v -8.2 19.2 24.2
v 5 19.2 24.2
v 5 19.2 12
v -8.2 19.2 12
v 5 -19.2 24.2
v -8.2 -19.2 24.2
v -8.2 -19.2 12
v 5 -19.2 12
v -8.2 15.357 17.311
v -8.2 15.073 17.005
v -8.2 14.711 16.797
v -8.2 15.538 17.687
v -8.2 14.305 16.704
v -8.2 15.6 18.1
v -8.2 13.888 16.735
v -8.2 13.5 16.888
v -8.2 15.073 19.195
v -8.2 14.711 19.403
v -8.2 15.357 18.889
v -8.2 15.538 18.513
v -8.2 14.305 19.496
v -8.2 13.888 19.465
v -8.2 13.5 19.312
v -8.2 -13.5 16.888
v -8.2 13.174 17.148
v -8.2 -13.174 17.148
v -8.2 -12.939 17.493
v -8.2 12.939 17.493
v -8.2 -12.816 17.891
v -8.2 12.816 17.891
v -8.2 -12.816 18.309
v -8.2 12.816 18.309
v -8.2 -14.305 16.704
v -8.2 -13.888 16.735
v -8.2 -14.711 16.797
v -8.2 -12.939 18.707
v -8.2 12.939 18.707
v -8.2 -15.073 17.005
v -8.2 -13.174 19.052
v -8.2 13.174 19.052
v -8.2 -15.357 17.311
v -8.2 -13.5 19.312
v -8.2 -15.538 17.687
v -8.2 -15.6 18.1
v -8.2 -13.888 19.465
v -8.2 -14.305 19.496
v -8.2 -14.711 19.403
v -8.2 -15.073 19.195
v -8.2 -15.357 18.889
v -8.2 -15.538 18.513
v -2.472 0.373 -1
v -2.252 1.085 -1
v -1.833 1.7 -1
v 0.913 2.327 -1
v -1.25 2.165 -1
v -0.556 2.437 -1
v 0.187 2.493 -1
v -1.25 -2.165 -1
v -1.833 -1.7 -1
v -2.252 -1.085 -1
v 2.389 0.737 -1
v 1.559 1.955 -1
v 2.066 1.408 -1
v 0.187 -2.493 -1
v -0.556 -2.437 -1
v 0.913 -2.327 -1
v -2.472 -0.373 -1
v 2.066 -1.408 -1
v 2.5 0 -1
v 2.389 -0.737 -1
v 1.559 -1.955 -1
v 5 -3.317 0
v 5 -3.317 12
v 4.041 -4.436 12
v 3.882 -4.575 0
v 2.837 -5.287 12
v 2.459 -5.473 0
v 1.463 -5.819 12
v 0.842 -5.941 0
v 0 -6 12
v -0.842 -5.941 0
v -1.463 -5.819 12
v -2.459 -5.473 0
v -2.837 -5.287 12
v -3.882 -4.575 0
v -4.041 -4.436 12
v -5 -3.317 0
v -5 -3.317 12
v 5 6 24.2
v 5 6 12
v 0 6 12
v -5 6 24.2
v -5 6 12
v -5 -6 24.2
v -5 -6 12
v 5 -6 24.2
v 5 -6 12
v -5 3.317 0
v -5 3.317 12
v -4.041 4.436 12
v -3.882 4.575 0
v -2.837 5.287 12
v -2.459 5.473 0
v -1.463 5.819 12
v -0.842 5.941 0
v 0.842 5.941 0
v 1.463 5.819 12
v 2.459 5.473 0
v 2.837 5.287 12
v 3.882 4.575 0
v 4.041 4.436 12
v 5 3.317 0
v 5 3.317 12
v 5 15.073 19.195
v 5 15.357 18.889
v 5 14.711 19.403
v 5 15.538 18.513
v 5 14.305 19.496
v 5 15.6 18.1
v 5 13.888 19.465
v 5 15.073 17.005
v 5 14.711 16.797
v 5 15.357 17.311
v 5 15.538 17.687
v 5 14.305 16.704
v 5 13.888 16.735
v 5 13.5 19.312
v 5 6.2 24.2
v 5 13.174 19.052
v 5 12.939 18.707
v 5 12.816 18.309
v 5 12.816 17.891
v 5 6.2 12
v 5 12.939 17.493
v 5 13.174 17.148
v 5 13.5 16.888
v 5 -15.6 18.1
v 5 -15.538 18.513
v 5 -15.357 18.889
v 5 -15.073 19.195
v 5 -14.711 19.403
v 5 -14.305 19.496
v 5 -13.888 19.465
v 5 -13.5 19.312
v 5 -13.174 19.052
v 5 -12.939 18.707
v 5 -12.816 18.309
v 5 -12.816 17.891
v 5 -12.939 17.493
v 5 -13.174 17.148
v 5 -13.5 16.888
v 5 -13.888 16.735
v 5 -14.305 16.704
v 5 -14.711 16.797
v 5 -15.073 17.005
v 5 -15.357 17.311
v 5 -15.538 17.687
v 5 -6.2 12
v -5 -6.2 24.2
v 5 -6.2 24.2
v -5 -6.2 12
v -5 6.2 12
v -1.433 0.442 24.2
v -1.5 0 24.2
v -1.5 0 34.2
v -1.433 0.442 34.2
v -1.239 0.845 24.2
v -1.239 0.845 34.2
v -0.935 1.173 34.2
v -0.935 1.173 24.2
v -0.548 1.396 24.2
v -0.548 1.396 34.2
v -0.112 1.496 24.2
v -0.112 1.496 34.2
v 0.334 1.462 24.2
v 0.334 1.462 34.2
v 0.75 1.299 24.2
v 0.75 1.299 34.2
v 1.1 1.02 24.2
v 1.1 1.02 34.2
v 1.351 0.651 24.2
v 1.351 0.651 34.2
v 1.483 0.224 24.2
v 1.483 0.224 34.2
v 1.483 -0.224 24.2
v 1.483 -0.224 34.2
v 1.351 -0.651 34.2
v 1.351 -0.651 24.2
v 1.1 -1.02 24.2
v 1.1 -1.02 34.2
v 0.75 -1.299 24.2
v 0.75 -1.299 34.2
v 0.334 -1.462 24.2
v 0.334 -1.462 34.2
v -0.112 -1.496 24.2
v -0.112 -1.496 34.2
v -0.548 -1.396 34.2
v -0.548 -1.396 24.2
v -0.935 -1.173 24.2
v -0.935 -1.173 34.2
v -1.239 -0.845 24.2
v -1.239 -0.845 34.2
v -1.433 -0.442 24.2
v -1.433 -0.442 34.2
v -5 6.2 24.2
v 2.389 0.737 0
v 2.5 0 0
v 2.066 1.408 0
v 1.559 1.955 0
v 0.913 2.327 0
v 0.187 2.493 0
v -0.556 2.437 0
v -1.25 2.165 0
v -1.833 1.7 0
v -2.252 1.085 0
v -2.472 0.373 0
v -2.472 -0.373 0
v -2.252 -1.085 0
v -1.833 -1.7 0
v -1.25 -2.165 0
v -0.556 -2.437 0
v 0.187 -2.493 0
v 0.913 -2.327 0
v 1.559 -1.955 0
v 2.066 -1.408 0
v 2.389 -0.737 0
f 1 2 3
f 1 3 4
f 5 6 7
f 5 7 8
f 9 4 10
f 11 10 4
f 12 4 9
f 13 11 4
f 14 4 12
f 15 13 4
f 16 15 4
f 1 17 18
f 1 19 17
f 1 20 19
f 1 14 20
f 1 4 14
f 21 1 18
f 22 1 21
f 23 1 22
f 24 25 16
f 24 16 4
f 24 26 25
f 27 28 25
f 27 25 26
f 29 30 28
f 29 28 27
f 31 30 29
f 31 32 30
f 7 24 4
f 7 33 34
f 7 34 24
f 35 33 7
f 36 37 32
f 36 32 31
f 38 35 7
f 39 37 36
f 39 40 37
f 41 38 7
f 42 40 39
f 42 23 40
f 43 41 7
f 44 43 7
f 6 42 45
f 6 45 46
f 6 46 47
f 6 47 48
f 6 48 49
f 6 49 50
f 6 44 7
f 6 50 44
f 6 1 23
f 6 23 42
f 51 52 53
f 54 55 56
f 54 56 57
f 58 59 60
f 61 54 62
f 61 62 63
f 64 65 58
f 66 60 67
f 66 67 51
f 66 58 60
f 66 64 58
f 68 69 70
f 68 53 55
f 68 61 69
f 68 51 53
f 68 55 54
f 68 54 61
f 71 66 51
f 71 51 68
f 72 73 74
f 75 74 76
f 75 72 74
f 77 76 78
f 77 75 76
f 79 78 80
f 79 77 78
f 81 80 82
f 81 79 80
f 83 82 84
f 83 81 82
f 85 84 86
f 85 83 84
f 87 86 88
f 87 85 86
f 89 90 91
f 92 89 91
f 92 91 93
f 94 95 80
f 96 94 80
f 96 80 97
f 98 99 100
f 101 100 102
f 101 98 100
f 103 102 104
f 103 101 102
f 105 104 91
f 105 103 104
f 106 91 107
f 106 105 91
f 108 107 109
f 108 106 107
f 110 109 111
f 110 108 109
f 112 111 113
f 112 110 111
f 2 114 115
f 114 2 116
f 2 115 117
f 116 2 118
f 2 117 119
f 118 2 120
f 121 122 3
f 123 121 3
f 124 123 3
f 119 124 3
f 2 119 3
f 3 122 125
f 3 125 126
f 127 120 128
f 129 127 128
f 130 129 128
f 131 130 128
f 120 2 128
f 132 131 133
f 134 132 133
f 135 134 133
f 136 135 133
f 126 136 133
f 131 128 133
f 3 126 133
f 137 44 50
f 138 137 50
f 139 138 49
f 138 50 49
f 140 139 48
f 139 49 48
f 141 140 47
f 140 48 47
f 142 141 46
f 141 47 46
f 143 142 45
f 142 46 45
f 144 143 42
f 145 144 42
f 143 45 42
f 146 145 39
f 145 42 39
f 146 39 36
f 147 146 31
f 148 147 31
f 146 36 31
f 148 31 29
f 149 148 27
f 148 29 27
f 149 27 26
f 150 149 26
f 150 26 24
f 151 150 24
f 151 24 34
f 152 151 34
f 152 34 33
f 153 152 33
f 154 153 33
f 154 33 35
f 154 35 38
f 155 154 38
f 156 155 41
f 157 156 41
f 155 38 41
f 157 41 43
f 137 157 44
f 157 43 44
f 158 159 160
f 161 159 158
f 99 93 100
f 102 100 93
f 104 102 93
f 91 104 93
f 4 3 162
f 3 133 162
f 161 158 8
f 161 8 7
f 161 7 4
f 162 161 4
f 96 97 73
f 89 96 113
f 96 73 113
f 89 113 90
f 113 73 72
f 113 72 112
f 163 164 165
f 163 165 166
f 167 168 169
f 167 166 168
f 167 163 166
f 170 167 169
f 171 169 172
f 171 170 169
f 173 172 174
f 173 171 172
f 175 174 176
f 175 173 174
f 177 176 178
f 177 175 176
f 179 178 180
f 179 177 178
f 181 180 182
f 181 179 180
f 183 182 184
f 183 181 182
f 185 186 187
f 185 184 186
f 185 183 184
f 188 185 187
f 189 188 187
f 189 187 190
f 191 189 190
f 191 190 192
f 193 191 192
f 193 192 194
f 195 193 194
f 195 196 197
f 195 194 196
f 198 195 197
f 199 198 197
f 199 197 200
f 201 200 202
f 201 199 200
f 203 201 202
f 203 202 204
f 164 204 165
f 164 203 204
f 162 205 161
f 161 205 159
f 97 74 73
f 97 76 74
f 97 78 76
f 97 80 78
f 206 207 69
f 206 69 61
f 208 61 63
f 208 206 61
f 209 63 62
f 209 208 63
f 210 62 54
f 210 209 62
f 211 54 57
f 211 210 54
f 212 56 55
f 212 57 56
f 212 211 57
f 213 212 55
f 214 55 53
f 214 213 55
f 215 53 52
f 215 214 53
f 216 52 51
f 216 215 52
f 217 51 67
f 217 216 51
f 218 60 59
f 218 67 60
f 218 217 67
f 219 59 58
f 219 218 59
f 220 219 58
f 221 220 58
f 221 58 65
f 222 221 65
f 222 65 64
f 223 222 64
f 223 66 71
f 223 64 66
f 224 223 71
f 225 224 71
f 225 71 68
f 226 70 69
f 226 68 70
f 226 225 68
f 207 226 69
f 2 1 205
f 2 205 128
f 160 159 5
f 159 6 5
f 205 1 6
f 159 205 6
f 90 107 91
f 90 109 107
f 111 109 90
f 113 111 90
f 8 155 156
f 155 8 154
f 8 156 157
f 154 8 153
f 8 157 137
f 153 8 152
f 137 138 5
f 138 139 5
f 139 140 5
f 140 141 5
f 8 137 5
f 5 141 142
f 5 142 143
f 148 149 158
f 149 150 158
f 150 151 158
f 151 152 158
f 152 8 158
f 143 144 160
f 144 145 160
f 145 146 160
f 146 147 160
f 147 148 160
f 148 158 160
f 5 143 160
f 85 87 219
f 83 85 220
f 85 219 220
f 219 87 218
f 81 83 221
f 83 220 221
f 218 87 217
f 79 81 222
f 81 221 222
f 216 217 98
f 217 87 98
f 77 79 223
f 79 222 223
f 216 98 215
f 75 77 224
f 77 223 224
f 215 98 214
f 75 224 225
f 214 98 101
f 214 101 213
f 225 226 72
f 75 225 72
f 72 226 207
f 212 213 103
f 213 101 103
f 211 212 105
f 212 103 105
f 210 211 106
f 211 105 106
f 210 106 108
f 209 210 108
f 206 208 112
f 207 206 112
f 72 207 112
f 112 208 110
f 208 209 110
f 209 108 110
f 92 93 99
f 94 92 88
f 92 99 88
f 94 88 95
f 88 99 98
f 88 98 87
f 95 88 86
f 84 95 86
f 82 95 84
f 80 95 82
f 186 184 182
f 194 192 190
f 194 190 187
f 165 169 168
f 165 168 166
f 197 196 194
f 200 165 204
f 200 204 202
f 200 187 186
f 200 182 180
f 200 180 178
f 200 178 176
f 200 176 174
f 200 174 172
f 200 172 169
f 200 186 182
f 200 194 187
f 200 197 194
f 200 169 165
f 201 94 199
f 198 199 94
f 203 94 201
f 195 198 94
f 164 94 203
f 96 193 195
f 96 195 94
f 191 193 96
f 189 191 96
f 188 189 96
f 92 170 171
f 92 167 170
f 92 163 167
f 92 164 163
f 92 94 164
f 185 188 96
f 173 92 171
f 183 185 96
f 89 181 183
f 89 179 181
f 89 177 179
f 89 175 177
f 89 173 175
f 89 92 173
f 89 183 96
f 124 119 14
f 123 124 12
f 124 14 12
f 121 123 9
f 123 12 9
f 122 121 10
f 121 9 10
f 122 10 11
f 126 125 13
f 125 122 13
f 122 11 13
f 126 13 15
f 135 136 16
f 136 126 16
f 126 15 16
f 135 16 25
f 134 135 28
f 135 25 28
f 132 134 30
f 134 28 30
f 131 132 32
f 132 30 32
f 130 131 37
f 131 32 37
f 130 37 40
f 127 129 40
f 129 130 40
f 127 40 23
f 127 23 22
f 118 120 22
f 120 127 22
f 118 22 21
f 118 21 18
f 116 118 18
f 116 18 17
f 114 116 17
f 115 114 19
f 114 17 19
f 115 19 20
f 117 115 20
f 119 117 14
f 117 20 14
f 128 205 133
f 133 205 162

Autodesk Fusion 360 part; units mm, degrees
sketch "Çizim1" plane through (0, 0, 0) normal (0, 0, 1) x (1, 0, 0)
  line L0 (5, 6) -> (-5, 6)
  line L1 (-5, 6) -> (-5, -6)
  line L2 (-5, -6) -> (5, -6)
  line L3 (5, -6) -> (5, 6)
  line L4 (5, 6) -> (-5, -6) construction
  line L5 (-5, 6) -> (5, -6) construction
  dimension "d1" = 10
  dimension "d2" = 12
extrude "Ekstrüzyon1" add sketch "Çizim1" along normal blind 24.2 makes body 1
sketch "Çizim2" plane through (0, 0, 24.2) normal (0, 0, 1) x (-1, 0, 0)
  line L0 (-5, 6) -> (-5, -6)
  line L1 (-5, -6) -> (5, -6)
  line L2 (5, -6) -> (5, 6)
  line L3 (5, 6) -> (-5, 6)
  circle A0 centre (0, 0) radius 1.5
  dimension "d5" = 3
extrude "Ekstrüzyon2" add sketch "Çizim2" along normal blind 10 contours A0 bodies 1
sketch "Çizim3" plane through (0, 0, 0) normal (0, 0, -1) x (1, 0, 0)
  line L0 (5, -6) -> (5, 6)
  line L1 (5, 6) -> (-5, 6)
  line L2 (-5, 6) -> (-5, -6)
  line L3 (-5, -6) -> (5, -6)
  circle A0 centre (0, 0) radius 2.5
  dimension "d8" = 5
extrude "Ekstrüzyon3" add sketch "Çizim3" along normal blind 1 contours A0 bodies 1
sketch "Çizim4" plane through (0, 0, 0) normal (0, 0, -1) x (1, 0, 0)
  circle A0 centre (0, 0) radius 2.5
  line L0 (5, -6) -> (5, 6)
  line L1 (5, 6) -> (-5, 6)
  line L2 (-5, 6) -> (-5, -6)
  line L3 (-5, -6) -> (5, -6)
  circle A1 centre (0, 0) radius 6
  dimension "d11" = 12
extrude "Ekstrüzyon4" cut sketch "Çizim4" against normal blind 12 contours L0 L3 A1 | L2 L3 A1 | L0 L1 A1 | L1 L2 A1 bodies 1
sketch "Çizim5" plane through (-5, 0, 0) normal (-1, 0, 0) x (0, -1, 0)
  line L0 (-3.3166, 12) -> (-3.3166, 0)
  line L1 (-3.3166, 0) -> (3.3166, 0)
  line L2 (3.3166, 0) -> (3.3166, 12)
  line L3 (3.3166, 12) -> (6, 12)
  line L4 (6, 12) -> (6, 24.2)
  line L5 (6, 24.2) -> (-6, 24.2)
  line L6 (-6, 24.2) -> (-6, 12)
  line L7 (-6, 12) -> (-3.3166, 12)
  line L8 (-6, 24.2) -> (6, 24.2)
  line L9 (6, 24.2) -> (6, 12)
  line L10 (6, 12) -> (-6, 12)
  line L11 (-6, 12) -> (-6, 24.2)
  line L12 (-6, 24.2) -> (-9.2, 24.2)
  line L13 (-9.2, 24.2) -> (-9.2, 12)
  line L14 (-9.2, 12) -> (-6, 12)
  line L15 (-6, 12) -> (-6, 24.2)
  line L16 (6, 24.2) -> (9.2, 24.2)
  line L17 (9.2, 24.2) -> (9.2, 12)
  line L18 (9.2, 12) -> (6, 12)
  line L19 (6, 12) -> (6, 24.2)
  dimension "d14" = 3.2
  dimension "d15" = 3.2
extrude "Ekstrüzyon5" add sketch "Çizim5" along normal blind 3.2 separate body contours L3 L4 L5 L6 L7 L8 L9 L10 L11 L15 L19 | L6 L11 L12 L13 L14 L15 | L4 L9 L16 L17 L18 L19 makes body 2
sketch "Çizim6" plane through (-5, 0, 0) normal (1, 0, 0) x (0, 1, 0)
  line L0 (9.2, 24.2) -> (-9.2, 24.2)
  line L1 (-9.2, 24.2) -> (-9.2, 12)
  line L2 (-9.2, 12) -> (9.2, 12)
  line L3 (9.2, 12) -> (9.2, 24.2)
  line L4 (-9.2, 24.2) -> (-6.2, 24.2)
  line L5 (-6.2, 24.2) -> (-6.2, 12)
  line L6 (-6.2, 12) -> (-9.2, 12)
  line L7 (-9.2, 12) -> (-9.2, 24.2)
  line L8 (9.2, 24.2) -> (6.2, 24.2)
  line L9 (6.2, 24.2) -> (6.2, 12)
  line L10 (6.2, 12) -> (9.2, 12)
  line L11 (9.2, 12) -> (9.2, 24.2)
  dimension "d18" = 3
  dimension "d19" = 3
extrude "Ekstrüzyon6" add sketch "Çizim6" along normal blind 10 contours L0 L2 L3 L8 L9 L10 L11 | L0 L1 L2 L4 L5 L6 L7 bodies 2
sketch "Çizim7" plane through (0, -9.2, 0) normal (0, -1, 0) x (1, 0, 0)
  line L0 (5, 24.2) -> (-8.2, 24.2)
  line L1 (-8.2, 24.2) -> (-8.2, 12)
  line L2 (-8.2, 12) -> (5, 12)
  line L3 (5, 12) -> (5, 24.2)
  line L4 (5, 24.2) -> (0, 24.2)
  line L5 (0, 24.2) -> (0, 12)
  line L6 (0, 12) -> (5, 12)
  line L7 (5, 12) -> (5, 24.2)
  dimension "d22" = 5
extrude "Ekstrüzyon7" add sketch "Çizim7" along normal blind 10 contours L0 L2 L3 L4 L5 L6 L7 bodies 2
sketch "Çizim8" plane through (0, 9.2, 0) normal (0, 1, 0) x (-1, 0, 0)
  line L0 (-5, 12) -> (8.2, 12)
  line L1 (8.2, 12) -> (8.2, 24.2)
  line L2 (8.2, 24.2) -> (-5, 24.2)
  line L3 (-5, 24.2) -> (-5, 12)
  line L4 (-5, 24.2) -> (0, 24.2)
  line L5 (0, 24.2) -> (0, 12)
  line L6 (0, 12) -> (-5, 12)
  line L7 (-5, 12) -> (-5, 24.2)
  dimension "d25" = 5
  dimension "d26" = 12.2
extrude "Ekstrüzyon8" add sketch "Çizim8" along normal blind 10 contours L0 L2 L3 L4 L5 L6 L7 bodies 2
sketch "Çizim9" plane through (0, 0, 0) normal (-1, 0, 0) x (0, -1, 0)
  line L0 (9.2, 24.2) -> (9.2, 12)
  line L1 (9.2, 12) -> (19.2, 12)
  line L2 (19.2, 12) -> (19.2, 24.2)
  line L3 (19.2, 24.2) -> (9.2, 24.2)
  line L4 (19.2, 18.1) -> (9.2, 18.1)
  line L5 (14.2, 12) -> (14.2, 18.1)
  circle A0 centre (14.2, 18.1) radius 1.4
  dimension "d29" = 2.8
extrude "Ekstrüzyon9" cut sketch "Çizim9" against normal blind 5 contours L4 A0 | L4 L5 A0 | L4 L5 A0 bodies 2
mirror "Ayna1" about plane through (0, 0, 0) normal (0, 1, 0) of "Ekstrüzyon9"
extrude "Ekstrüzyon10" add 2 faces at (0, -14.2349, 22.632) (0, 14.1651, 13.568) along direction (-1, 0, 0) blind 8.2 on bodies 2 bodies 2
equation "d18 = 3.2 mm - 0.2 mm"
